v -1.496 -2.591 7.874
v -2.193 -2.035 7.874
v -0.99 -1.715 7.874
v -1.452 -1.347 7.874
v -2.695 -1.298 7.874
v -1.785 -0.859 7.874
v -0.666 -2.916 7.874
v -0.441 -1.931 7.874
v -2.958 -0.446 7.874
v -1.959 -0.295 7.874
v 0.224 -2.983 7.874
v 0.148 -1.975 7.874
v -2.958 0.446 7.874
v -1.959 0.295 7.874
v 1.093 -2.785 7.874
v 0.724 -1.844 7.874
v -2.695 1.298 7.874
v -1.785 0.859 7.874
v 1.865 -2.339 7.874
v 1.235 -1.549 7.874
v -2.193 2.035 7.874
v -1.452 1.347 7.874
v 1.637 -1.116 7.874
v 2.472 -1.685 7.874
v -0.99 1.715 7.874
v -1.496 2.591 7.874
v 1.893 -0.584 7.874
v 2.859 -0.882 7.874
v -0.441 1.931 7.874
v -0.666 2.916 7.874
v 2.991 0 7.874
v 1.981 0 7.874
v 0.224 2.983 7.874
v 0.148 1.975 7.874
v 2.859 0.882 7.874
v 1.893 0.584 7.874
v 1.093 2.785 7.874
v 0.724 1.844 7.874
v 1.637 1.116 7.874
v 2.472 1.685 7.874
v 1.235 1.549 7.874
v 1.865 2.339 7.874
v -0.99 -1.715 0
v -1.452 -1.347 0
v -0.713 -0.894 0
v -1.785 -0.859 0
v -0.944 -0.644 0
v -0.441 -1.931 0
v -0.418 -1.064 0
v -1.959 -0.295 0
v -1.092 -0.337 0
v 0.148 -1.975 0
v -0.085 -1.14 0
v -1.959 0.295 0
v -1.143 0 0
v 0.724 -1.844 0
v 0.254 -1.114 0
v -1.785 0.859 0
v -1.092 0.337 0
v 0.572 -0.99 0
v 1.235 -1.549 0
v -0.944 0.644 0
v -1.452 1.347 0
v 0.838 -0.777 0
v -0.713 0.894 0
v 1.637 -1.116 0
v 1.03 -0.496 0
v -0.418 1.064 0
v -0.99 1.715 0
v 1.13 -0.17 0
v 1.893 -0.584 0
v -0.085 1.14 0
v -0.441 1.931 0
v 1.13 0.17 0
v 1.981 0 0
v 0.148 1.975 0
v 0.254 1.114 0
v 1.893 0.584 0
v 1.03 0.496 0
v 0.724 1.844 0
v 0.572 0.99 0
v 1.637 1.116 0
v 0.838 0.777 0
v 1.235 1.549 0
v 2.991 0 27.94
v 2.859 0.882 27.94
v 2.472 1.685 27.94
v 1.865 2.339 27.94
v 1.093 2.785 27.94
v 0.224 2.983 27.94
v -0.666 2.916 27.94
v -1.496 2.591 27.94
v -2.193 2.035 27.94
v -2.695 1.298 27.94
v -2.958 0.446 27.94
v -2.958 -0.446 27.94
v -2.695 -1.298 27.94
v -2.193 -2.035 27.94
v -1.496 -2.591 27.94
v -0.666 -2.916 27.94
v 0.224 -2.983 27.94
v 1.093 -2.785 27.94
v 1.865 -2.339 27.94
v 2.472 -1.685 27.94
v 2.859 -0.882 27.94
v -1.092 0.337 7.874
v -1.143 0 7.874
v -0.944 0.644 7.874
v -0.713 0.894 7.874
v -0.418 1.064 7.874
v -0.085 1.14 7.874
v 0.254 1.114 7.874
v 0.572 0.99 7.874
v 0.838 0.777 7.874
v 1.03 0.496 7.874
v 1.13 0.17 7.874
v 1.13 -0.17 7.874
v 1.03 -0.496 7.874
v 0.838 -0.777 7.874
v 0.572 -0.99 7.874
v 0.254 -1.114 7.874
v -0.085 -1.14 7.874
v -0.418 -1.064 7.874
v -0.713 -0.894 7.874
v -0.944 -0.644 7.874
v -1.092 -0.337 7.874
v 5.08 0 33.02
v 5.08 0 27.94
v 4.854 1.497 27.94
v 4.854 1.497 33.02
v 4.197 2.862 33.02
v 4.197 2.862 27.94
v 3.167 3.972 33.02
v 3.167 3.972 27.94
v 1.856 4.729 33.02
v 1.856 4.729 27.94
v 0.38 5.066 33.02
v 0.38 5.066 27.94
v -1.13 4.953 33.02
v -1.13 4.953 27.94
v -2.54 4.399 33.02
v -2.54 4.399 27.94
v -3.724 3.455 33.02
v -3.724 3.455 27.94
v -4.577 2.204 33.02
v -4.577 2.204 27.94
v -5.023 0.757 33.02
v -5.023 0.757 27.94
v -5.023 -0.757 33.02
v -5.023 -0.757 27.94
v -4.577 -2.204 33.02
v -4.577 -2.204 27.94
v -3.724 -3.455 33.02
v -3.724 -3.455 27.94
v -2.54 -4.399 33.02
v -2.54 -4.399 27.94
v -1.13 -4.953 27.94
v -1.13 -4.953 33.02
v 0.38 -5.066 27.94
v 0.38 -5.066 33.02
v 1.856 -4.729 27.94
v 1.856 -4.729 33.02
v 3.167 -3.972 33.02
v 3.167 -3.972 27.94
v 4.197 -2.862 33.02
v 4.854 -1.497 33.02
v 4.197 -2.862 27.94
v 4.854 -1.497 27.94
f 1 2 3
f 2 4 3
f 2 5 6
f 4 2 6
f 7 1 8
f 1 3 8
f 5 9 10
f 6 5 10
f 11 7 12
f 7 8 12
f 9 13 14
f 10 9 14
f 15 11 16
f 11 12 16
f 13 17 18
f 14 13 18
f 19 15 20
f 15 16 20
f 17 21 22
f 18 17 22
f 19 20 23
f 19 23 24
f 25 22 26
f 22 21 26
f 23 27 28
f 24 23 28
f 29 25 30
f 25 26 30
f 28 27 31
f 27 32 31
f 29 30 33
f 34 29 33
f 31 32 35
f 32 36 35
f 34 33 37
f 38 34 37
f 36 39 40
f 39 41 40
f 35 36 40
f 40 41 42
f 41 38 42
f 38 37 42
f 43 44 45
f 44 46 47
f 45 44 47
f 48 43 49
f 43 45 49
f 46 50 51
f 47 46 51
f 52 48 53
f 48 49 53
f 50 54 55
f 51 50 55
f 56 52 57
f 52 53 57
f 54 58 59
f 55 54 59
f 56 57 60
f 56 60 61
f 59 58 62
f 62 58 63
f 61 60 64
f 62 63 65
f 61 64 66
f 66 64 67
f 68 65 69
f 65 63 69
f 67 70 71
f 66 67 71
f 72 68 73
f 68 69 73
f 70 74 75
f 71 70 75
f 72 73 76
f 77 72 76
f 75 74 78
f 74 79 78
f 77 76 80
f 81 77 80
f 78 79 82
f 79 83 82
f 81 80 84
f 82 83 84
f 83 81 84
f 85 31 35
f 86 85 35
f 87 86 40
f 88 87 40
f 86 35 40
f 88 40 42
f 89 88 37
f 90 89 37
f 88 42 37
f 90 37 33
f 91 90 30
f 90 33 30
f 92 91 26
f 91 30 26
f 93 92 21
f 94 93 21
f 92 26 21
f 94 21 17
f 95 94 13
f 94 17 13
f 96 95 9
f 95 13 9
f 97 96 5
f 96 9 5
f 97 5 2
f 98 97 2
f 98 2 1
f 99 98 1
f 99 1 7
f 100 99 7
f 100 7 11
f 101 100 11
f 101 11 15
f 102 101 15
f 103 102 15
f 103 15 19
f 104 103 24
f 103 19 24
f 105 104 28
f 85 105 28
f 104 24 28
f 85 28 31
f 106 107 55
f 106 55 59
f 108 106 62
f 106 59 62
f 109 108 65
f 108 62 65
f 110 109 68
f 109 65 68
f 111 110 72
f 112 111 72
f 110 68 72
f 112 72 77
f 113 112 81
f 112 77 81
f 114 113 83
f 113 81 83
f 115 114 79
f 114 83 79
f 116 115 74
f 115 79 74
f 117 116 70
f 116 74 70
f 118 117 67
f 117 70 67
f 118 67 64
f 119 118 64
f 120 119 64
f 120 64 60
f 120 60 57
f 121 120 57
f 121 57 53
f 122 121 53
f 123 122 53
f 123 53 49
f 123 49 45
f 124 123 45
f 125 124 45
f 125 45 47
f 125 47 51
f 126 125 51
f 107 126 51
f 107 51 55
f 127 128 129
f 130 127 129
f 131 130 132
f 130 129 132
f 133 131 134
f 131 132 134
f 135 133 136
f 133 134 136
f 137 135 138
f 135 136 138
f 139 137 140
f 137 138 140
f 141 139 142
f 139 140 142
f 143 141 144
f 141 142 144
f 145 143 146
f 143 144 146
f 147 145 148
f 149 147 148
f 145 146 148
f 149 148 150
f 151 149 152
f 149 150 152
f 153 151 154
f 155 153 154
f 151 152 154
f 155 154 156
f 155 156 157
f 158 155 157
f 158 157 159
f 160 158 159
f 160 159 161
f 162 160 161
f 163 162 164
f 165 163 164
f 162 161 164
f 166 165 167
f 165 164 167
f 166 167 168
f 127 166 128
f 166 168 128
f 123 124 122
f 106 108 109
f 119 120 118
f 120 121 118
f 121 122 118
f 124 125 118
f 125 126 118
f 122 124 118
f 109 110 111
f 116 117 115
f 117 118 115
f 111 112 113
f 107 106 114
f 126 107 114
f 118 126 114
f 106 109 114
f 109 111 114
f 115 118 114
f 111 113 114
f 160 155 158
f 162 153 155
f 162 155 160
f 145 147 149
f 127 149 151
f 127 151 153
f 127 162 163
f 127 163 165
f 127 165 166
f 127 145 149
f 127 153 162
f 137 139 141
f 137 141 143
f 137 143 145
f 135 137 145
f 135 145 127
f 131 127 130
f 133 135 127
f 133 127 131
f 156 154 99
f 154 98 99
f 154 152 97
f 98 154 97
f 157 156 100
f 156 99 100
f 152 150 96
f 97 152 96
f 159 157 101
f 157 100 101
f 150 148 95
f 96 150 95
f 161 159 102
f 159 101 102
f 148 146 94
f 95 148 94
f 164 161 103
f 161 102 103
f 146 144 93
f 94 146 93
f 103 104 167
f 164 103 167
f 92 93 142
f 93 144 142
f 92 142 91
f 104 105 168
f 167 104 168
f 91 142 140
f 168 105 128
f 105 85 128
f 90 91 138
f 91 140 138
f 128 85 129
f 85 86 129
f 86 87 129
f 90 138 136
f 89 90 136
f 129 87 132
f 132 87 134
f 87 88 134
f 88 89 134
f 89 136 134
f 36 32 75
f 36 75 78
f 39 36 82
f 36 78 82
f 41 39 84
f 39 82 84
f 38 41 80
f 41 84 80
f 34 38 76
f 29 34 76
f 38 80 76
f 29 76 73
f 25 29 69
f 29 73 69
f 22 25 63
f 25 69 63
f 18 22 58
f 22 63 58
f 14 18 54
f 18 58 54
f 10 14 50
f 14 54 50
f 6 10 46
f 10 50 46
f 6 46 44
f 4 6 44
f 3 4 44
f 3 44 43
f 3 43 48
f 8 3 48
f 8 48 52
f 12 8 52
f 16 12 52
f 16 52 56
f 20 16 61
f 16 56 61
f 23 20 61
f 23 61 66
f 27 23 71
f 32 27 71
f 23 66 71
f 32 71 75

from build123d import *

# Parameters (mm, degrees)
SKETCH1_R           = 1.9808444
BOSS_EXTRUDE1_DEPTH = 7.874
SKETCH2_R           = 1.143
CUT_EXTRUDE2_DEPTH  = 8.874
SKETCH3_R           = 2.99147738
BOSS_EXTRUDE2_DEPTH = 20.066
SKETCH4_R           = 5.08
BOSS_EXTRUDE3_DEPTH = 5.08


with BuildPart() as part:
    # Sketch1 → Boss-Extrude1 (new body)
    with BuildSketch(Plane.XY):
        Circle(SKETCH1_R)
    extrude(amount=BOSS_EXTRUDE1_DEPTH)

    # Sketch2 → Cut-Extrude2 (cut, through all)
    with BuildSketch(Plane(origin=(0, 0, 0), x_dir=(-1, 0, 0), z_dir=(0, 0, -1))):
        Circle(SKETCH2_R)
    extrude(amount=-CUT_EXTRUDE2_DEPTH, mode=Mode.SUBTRACT)

    # Sketch3 → Boss-Extrude2 (add)
    with BuildSketch(Plane.XY.offset(7.874)):
        Circle(SKETCH3_R)
    extrude(amount=BOSS_EXTRUDE2_DEPTH)

    # Sketch4 → Boss-Extrude3 (add)
    with BuildSketch(Plane.XY.offset(27.94)):
        Circle(SKETCH4_R)
    extrude(amount=BOSS_EXTRUDE3_DEPTH)


solid = part.part
